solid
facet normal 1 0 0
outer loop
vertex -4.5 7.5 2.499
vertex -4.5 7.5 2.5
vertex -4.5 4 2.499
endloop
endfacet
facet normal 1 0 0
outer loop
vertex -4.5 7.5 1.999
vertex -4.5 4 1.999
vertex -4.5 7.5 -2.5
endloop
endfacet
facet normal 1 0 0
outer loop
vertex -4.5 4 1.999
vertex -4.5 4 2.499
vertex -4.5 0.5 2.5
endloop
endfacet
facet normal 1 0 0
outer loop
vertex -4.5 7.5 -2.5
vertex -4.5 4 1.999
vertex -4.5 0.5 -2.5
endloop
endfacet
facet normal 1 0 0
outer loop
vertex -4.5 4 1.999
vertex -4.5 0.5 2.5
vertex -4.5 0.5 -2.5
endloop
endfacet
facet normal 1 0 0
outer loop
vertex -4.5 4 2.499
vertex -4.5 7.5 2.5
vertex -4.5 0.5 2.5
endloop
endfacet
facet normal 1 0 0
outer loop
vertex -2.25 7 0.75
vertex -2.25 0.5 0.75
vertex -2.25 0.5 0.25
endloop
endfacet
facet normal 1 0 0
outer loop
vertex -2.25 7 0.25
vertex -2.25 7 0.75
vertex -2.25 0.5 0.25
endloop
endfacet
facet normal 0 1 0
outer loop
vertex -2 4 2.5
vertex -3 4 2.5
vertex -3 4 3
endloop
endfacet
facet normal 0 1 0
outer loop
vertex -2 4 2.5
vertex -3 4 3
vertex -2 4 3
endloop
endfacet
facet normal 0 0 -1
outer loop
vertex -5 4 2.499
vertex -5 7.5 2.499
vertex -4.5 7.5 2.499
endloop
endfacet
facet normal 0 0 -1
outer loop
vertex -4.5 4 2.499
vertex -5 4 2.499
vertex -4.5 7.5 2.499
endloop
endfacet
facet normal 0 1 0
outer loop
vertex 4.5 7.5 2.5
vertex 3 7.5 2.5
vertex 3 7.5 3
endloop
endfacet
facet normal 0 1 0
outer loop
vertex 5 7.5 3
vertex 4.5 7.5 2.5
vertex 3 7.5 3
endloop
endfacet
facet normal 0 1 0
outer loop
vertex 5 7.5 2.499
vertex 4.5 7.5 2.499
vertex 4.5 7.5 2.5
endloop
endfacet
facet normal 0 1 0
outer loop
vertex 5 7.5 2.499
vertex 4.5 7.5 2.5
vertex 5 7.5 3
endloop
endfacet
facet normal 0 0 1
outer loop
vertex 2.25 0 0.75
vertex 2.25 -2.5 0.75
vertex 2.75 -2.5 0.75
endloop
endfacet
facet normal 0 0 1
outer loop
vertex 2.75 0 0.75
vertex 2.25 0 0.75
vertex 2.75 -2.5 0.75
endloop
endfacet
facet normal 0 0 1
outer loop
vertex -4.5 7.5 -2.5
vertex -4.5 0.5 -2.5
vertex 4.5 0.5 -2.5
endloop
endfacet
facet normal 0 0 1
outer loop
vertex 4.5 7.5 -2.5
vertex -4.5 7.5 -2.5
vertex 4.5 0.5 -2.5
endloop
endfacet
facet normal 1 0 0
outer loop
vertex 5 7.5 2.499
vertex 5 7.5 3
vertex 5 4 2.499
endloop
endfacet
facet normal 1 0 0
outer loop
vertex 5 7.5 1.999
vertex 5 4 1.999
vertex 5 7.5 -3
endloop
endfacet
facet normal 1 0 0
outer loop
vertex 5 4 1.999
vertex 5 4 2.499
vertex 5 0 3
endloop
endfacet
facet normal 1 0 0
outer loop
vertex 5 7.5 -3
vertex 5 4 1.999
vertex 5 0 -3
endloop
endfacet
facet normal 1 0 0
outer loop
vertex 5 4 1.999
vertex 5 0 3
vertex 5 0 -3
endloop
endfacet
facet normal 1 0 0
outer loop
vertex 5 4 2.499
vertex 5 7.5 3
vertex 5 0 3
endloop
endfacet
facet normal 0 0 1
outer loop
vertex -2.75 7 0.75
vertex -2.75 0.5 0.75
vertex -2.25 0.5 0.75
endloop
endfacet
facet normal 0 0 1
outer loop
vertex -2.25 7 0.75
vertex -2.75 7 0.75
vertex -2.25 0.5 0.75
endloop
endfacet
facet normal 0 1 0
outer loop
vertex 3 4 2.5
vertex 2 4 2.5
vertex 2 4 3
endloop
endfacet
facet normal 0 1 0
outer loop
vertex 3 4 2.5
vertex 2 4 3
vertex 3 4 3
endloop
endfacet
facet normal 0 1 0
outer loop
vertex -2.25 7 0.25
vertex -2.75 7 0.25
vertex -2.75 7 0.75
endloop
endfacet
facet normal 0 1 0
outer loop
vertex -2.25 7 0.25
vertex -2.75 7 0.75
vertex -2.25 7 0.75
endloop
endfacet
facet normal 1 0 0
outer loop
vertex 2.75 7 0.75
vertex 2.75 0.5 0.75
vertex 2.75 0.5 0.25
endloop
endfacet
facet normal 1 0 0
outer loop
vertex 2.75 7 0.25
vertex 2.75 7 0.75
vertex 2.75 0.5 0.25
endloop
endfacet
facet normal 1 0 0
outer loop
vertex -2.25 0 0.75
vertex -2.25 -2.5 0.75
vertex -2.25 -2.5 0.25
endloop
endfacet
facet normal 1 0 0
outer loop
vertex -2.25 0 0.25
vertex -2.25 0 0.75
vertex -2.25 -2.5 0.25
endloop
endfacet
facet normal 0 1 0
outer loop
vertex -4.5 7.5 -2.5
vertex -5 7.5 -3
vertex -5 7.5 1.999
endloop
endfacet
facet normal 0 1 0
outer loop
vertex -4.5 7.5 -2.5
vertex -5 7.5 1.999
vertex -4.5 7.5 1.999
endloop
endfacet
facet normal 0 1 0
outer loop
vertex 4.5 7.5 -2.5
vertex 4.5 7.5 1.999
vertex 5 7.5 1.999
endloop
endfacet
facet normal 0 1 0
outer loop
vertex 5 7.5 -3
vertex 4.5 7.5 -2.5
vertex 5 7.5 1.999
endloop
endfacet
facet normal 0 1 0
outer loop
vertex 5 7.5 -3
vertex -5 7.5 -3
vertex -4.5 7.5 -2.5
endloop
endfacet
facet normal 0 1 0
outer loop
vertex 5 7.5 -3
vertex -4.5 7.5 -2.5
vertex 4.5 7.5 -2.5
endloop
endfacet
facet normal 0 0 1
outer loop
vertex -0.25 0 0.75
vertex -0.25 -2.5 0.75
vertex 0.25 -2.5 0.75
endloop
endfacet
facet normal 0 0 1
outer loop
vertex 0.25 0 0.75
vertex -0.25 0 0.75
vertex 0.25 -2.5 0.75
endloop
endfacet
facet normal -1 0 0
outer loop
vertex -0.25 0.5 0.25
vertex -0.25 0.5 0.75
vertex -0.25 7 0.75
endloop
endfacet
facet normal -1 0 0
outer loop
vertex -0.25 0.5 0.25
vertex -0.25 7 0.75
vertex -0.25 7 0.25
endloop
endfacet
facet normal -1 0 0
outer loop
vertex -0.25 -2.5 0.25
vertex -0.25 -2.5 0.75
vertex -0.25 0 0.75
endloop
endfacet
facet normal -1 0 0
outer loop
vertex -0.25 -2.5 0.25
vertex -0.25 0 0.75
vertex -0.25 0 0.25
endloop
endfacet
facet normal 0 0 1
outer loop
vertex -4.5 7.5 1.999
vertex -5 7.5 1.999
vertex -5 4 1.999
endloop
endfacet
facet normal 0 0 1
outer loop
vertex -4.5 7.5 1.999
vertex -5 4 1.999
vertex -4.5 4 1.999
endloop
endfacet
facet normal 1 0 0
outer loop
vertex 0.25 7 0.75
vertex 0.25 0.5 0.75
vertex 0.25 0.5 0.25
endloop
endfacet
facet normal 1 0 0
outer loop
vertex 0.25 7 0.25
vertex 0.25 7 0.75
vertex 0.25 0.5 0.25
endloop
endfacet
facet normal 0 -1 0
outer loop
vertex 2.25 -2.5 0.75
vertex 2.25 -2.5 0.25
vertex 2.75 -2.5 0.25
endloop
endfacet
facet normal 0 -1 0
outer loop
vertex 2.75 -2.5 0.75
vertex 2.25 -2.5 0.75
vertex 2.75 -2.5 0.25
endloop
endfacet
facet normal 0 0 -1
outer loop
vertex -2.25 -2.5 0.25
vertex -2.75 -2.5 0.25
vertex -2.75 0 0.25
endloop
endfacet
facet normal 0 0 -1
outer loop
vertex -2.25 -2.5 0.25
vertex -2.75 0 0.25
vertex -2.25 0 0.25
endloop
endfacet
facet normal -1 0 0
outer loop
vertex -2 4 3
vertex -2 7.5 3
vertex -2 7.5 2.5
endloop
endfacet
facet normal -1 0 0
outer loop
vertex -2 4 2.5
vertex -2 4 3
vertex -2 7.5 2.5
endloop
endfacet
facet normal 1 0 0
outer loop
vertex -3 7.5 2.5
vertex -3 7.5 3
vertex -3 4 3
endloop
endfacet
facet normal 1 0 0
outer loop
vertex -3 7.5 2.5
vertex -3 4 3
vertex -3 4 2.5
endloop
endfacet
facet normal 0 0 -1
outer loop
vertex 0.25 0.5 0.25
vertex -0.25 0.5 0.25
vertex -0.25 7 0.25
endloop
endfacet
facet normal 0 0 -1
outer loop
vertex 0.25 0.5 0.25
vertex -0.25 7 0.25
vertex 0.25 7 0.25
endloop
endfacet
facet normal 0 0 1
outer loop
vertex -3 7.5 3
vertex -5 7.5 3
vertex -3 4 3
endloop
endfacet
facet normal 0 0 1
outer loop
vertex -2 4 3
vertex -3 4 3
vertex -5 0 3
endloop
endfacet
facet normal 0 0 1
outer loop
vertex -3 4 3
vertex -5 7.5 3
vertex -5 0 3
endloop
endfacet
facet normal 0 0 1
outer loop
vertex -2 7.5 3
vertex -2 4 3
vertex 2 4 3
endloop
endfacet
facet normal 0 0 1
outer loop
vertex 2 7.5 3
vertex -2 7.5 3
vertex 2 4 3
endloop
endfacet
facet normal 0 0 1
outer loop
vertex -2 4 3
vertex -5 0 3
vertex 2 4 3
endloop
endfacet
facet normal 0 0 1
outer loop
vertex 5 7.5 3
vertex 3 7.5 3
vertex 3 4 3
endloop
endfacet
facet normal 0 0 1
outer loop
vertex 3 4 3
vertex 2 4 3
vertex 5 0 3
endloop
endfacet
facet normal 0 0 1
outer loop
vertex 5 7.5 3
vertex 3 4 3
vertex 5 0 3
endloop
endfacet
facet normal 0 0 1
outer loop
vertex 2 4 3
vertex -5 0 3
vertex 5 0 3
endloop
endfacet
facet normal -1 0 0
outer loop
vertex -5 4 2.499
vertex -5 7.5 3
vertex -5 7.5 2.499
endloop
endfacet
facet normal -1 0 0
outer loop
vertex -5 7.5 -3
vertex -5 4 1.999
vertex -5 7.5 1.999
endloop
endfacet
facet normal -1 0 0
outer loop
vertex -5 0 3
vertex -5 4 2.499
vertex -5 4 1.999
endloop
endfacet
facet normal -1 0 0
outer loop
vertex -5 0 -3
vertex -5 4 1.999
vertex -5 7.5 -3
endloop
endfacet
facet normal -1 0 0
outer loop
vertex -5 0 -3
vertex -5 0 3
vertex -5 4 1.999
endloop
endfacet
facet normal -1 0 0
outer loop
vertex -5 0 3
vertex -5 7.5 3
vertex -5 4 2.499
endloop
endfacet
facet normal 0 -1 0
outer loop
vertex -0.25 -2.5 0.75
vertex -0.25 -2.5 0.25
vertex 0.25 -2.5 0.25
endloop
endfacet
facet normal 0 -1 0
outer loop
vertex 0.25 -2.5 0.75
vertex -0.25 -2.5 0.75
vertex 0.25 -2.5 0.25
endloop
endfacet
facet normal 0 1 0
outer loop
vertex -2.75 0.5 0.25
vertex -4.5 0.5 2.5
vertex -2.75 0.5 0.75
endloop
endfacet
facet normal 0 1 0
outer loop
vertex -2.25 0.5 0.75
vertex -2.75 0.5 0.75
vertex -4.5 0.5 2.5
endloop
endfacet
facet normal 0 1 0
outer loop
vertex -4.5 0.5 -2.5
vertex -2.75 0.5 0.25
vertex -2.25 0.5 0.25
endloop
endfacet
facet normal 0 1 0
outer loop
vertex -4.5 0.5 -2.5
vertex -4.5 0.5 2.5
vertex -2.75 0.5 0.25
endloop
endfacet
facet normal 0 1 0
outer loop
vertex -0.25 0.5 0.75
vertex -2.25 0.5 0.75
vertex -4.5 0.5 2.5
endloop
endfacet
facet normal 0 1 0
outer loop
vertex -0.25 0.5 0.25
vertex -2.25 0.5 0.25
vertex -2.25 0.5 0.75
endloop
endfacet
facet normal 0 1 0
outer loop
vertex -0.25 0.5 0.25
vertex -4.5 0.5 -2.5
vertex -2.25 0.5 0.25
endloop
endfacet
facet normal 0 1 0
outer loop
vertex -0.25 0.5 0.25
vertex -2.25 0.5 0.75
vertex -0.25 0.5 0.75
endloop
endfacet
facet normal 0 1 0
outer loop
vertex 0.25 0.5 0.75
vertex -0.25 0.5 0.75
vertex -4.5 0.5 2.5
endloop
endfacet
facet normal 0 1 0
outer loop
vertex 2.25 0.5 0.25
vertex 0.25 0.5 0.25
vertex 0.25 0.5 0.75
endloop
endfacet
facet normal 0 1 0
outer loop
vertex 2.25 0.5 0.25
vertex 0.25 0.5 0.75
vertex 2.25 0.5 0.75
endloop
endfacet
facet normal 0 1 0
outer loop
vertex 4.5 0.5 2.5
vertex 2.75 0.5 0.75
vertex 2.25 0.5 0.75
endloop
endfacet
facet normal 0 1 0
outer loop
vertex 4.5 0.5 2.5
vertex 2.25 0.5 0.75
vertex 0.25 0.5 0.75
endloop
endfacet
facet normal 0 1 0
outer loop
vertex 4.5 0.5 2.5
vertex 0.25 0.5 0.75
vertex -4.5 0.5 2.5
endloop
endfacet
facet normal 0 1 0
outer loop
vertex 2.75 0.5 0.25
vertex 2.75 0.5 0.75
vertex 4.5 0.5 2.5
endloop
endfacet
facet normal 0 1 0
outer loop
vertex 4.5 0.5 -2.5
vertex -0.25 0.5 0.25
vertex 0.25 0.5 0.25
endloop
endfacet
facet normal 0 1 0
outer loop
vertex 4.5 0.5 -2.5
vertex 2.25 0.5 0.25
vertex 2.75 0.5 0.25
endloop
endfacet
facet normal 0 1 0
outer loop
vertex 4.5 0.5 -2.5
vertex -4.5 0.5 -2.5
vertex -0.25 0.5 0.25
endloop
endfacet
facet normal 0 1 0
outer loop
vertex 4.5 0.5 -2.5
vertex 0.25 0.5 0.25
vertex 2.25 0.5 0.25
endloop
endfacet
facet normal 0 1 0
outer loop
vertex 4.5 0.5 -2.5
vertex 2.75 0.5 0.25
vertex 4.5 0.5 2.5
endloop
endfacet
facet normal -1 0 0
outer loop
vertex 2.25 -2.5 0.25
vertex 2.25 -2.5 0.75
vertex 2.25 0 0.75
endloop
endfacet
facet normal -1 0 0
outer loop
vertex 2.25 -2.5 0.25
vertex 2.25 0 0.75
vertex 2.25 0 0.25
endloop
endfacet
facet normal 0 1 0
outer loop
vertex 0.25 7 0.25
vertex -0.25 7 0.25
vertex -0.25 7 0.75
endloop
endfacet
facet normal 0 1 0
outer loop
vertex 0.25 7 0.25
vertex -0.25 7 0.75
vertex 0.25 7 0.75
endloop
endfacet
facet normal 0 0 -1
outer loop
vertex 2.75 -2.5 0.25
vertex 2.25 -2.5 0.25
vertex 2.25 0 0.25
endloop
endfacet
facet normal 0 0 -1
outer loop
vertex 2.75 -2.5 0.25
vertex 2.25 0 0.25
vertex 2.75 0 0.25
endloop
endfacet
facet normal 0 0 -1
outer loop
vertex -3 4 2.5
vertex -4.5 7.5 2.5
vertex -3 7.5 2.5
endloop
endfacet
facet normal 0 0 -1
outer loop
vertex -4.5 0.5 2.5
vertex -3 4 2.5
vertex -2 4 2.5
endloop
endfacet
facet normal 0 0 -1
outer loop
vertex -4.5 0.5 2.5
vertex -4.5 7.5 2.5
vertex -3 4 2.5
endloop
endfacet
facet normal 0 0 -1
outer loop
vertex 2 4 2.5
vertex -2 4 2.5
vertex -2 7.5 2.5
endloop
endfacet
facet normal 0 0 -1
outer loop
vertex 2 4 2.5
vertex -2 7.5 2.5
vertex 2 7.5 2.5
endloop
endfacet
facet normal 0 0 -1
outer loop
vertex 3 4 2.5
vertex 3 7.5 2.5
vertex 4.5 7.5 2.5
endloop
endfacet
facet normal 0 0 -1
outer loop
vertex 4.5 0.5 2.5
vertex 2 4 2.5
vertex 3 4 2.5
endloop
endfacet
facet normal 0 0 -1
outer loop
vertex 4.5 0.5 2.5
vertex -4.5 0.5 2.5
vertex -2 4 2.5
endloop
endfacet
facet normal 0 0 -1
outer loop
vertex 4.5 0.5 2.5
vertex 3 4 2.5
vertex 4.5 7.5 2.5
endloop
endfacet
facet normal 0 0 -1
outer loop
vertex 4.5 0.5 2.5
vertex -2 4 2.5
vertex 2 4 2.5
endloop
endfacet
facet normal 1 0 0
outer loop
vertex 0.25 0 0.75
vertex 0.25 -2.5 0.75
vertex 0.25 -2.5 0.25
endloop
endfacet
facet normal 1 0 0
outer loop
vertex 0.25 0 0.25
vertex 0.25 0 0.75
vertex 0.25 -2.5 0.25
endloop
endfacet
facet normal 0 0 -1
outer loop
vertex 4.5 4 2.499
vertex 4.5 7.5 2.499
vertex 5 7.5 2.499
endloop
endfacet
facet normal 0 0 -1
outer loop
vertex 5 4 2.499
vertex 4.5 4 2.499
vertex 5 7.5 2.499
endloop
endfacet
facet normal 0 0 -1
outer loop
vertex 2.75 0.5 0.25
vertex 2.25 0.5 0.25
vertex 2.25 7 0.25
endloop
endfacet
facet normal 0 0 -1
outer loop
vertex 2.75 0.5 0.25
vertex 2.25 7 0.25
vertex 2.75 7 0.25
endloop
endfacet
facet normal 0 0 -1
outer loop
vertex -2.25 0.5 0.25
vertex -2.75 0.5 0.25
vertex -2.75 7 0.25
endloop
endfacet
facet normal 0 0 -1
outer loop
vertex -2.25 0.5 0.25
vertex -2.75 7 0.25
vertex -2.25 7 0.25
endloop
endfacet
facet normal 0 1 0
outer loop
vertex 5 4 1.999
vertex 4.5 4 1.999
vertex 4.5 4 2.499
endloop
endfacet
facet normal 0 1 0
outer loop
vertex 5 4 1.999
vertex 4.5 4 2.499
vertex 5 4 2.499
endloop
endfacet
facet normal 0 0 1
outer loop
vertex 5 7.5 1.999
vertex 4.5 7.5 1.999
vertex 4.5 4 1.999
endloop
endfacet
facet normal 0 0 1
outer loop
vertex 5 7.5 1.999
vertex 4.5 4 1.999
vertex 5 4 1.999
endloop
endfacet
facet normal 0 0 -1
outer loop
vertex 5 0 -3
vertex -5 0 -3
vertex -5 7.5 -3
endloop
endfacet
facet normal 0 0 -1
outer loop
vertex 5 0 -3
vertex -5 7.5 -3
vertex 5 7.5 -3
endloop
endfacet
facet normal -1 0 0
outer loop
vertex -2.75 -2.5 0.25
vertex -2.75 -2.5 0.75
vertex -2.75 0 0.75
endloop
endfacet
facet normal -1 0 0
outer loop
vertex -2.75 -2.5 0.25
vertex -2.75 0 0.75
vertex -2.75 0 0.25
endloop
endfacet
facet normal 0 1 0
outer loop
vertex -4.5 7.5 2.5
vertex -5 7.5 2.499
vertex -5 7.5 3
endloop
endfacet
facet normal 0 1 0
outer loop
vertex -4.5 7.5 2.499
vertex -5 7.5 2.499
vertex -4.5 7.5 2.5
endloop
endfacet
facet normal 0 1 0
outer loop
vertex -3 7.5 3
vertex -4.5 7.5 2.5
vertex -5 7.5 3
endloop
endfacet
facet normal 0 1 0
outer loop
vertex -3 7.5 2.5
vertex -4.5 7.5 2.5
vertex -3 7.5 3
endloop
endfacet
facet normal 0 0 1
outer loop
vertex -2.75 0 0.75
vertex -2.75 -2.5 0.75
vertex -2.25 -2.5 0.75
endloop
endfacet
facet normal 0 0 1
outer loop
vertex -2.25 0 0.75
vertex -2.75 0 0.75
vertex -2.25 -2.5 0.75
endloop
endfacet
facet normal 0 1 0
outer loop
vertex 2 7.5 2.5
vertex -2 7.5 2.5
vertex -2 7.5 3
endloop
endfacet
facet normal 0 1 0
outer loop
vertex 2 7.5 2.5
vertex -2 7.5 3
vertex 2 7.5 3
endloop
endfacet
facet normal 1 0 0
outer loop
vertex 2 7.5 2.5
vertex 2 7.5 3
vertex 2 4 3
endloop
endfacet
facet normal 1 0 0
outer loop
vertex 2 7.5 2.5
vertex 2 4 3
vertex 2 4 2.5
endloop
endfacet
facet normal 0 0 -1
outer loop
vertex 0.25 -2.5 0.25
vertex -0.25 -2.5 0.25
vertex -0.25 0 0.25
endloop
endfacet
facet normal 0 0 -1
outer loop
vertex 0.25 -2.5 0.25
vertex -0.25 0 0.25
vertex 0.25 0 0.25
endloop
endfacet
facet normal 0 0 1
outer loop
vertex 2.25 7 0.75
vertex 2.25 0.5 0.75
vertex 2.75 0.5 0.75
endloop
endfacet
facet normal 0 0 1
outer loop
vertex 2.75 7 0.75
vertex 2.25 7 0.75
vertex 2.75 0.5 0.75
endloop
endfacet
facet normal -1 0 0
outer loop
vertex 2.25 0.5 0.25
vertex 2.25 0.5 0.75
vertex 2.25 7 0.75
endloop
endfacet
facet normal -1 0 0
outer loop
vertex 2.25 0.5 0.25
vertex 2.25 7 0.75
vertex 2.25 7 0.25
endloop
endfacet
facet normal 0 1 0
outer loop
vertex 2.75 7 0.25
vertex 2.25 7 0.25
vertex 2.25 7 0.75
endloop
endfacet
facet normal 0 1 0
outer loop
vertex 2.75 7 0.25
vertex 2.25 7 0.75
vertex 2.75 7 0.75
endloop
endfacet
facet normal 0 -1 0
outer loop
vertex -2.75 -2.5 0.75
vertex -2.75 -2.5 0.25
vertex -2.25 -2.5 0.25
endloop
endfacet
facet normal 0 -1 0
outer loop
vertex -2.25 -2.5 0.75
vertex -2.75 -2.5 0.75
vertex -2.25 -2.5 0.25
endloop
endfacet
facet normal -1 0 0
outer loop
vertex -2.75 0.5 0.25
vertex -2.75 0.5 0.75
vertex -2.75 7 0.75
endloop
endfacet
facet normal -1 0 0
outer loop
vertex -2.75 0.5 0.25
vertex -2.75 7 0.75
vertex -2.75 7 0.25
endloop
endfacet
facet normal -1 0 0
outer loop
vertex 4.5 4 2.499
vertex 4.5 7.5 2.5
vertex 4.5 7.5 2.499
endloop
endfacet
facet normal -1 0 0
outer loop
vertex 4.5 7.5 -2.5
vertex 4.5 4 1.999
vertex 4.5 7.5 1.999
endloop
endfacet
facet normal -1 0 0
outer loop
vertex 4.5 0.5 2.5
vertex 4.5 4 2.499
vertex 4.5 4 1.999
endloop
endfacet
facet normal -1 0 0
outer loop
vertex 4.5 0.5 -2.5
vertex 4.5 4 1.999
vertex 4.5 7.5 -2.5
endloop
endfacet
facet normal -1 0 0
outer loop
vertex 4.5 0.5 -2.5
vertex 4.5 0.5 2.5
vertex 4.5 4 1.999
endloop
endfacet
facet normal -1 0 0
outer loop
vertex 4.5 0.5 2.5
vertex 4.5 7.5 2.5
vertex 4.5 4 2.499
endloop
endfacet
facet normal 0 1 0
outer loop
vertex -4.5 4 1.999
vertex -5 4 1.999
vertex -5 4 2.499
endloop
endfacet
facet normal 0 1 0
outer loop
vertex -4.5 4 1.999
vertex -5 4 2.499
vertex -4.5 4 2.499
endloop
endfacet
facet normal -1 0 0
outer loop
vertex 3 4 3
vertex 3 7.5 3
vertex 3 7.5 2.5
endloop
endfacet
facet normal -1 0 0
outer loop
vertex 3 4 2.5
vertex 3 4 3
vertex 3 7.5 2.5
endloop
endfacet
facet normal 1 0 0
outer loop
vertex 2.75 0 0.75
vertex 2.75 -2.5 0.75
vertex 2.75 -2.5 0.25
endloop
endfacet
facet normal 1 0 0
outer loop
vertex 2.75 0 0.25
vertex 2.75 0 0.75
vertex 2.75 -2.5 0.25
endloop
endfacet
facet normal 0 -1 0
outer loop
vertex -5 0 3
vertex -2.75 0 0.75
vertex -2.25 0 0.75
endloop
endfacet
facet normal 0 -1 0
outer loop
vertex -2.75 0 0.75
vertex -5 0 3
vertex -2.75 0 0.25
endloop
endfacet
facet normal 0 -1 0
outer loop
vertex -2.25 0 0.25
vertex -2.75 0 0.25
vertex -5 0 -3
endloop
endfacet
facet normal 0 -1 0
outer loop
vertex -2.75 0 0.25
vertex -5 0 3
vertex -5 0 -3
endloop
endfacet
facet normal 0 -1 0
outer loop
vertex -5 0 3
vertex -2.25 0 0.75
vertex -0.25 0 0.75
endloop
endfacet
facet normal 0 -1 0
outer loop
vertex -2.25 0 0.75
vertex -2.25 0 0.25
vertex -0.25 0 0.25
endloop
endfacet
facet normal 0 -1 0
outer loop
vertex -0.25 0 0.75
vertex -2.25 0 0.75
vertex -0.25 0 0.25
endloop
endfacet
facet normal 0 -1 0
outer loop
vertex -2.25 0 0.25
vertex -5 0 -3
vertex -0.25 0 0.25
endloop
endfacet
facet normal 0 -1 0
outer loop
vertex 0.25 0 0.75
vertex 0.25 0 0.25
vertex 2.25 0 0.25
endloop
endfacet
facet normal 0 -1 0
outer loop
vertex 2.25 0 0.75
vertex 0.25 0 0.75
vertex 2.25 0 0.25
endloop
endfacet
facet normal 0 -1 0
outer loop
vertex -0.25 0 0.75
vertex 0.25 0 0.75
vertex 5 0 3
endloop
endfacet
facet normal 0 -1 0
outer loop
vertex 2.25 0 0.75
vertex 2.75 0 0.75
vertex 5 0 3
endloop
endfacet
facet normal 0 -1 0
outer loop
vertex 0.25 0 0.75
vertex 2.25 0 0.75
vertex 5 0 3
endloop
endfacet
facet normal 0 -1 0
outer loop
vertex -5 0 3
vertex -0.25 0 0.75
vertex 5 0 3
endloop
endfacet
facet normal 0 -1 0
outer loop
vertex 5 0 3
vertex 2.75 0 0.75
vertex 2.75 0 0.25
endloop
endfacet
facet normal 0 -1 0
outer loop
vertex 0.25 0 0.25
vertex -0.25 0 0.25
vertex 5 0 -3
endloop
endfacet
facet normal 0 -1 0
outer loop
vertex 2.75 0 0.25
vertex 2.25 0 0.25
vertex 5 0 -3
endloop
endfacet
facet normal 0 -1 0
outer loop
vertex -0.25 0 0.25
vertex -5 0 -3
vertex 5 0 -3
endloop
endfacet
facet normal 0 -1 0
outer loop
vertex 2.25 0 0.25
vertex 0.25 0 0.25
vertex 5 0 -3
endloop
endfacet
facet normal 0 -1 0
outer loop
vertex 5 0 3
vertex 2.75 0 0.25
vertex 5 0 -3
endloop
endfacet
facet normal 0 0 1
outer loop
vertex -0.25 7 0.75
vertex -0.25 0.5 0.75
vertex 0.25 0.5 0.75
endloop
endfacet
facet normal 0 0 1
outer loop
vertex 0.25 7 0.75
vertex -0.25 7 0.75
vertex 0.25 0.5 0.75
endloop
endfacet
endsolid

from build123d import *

# Parameters (mm, degrees)
SKETCH_1_W           = 10
SKETCH_1_H           = 6
EXTRUDE_1_DEPTH      = 7.5
SHELL_1_T            = -0.5
SKETCH_2_W           = 13.621733733
SKETCH_2_H           = 0.5
SKETCH_2_W_2         = 1
SKETCH_2_H_2         = 1.110036837
CUT_EXTRUDE_1_DEPTH  = 3.5
EXTRUDE_2_DEPTH      = 6.5
EXTRUDE_2_DEPTH_BACK = 3
SKETCH_3_W           = 0.5
SKETCH_3_H           = 0.5


with BuildPart() as part:
    # 草图1 → 凸台-拉伸1 (new body)
    with BuildSketch(Plane(origin=(0, 0, 0), x_dir=(1, 0, 0), z_dir=(0, 1, 0))):
        Rectangle(SKETCH_1_W, SKETCH_1_H)
    extrude(amount=EXTRUDE_1_DEPTH)

    # 抽壳1
    shell_1_openings = [part.faces().sort_by_distance(p)[0] for p in [
        (0, 7.5, 0),
    ]]
    offset(amount=SHELL_1_T, openings=shell_1_openings, kind=Kind.INTERSECTION)

    # 草图2 → 切除-拉伸1 (cut)
    with BuildSketch(Plane(origin=(0, 7.5, 0), x_dir=(1, 0, 0), z_dir=(0, 1, 0))):
        with Locations((0.222754883, -2.249)):
            Rectangle(SKETCH_2_W, SKETCH_2_H)
        with Locations((-2.5, -3.055018419)):
            Rectangle(SKETCH_2_W_2, SKETCH_2_H_2)
        with Locations((2.5, -3.055018419)):
            Rectangle(SKETCH_2_W_2, SKETCH_2_H_2)
    extrude(amount=-CUT_EXTRUDE_1_DEPTH, mode=Mode.SUBTRACT)

    # 草图3 → 凸台-拉伸2 (add, two sides: drawn at the far end of the back side and taken through both)
    with BuildSketch(Plane(origin=(0, 0.5, 0), x_dir=(1, 0, 0), z_dir=(0, 1, 0)).offset(-EXTRUDE_2_DEPTH_BACK)):
        with Locations((0, -0.5)):
            Rectangle(SKETCH_3_W, SKETCH_3_H)
        with Locations((-2.5, -0.5)):
            Rectangle(SKETCH_3_W, SKETCH_3_H)
        with Locations((2.5, -0.5)):
            Rectangle(SKETCH_3_W, SKETCH_3_H)
    extrude(amount=EXTRUDE_2_DEPTH + EXTRUDE_2_DEPTH_BACK)


solid = part.part
